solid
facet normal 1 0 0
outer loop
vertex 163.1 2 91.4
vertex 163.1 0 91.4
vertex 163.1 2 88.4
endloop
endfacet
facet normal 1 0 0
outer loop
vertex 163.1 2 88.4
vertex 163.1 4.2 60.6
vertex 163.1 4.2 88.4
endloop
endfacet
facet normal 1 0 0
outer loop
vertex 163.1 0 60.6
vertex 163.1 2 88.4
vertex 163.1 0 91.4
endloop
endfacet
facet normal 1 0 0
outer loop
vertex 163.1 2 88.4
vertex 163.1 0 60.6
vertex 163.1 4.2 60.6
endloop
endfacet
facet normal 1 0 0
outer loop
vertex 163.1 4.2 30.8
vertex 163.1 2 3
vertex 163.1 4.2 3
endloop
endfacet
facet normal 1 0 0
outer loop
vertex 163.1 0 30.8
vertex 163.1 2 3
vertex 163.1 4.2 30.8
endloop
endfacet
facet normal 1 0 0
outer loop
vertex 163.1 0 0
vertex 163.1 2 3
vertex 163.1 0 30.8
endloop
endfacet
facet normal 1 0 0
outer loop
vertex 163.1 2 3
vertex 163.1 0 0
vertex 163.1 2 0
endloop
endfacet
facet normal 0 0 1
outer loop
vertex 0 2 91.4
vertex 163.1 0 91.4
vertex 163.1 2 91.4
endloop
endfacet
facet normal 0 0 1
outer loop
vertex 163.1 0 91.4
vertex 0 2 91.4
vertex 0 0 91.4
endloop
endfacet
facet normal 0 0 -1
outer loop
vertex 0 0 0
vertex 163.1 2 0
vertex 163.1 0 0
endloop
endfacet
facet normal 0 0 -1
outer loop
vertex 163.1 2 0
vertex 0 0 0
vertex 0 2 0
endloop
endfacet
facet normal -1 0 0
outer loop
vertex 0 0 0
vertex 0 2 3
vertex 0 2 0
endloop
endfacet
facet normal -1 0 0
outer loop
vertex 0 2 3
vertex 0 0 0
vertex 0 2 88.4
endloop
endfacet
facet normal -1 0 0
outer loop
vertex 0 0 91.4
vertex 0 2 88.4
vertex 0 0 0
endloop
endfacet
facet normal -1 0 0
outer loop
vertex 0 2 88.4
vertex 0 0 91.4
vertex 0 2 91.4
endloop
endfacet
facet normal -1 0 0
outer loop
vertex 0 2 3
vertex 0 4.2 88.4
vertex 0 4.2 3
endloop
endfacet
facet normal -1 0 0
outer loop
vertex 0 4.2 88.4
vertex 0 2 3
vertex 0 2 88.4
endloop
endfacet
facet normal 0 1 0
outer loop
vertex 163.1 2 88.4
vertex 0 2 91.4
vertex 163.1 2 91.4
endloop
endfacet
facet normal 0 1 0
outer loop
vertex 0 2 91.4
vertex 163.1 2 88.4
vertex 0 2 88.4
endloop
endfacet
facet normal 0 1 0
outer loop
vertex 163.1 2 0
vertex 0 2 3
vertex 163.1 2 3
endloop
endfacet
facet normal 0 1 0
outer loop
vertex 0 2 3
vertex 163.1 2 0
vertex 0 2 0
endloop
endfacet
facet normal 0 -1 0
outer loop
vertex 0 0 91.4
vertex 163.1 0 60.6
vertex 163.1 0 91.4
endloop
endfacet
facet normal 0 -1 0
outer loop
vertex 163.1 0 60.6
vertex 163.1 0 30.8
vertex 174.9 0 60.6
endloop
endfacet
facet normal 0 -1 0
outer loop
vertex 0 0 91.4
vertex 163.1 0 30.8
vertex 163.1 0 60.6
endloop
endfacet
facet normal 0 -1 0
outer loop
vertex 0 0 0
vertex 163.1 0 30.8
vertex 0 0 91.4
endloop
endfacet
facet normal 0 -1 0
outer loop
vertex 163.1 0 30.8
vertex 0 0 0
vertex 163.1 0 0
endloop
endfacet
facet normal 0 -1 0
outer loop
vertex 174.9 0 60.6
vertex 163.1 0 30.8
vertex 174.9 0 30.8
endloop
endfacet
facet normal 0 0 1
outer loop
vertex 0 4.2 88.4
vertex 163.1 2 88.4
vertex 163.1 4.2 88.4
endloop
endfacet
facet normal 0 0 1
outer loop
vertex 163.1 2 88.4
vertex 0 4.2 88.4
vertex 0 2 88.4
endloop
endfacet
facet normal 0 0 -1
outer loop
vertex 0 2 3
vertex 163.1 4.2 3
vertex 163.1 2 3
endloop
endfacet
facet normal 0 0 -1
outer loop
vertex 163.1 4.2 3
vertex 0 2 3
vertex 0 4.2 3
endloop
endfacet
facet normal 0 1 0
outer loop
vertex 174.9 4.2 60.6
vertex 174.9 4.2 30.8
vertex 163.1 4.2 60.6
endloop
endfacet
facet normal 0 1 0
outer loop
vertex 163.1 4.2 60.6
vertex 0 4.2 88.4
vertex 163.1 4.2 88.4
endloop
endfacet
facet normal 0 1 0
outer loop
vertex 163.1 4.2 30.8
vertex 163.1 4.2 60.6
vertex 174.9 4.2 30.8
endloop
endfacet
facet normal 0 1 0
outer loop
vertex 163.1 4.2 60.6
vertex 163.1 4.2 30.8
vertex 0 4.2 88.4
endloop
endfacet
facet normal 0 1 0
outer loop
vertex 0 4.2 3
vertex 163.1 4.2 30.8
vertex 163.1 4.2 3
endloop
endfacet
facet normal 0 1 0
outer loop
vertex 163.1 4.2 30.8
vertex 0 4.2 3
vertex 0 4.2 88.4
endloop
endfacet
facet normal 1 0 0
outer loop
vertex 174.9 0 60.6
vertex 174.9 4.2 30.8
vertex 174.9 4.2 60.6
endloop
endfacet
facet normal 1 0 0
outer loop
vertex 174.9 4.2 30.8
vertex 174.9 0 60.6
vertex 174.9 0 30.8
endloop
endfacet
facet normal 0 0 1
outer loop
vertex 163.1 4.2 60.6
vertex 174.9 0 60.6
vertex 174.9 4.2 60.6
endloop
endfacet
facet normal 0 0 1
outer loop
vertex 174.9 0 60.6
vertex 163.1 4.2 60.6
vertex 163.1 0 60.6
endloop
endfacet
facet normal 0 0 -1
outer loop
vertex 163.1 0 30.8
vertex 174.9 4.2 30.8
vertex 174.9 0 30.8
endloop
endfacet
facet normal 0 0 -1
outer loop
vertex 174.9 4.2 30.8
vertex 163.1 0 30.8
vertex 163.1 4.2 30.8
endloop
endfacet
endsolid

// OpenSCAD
// Side box back door (SolidWorks part 004). Slides into the grooves on the
// back of a side box. Same stepped profile as the display door: the wide flange
// rides in the grooves and the narrow lip fills the opening flush with the back.
// A full-thickness tab sticks out of the inner end (toward the center body).
// The same part is used for both side boxes (the right one is rotated 180°).
// Frame: X = length, Y = depth (0 = inside face, toward the front), Z = height.

side_door_l = 163.1;          // length without the tab
side_door_h = 91.4;           // flange height (rides in the grooves)
side_door_flange_t = 2.0;     // flange thickness
side_door_lip_t = 2.2;        // lip thickness (flush with the back)
side_door_lip_inset = 3.0;    // lip is shorter than the flange by this much at top and bottom
side_door_tab_l = 11.8;       // tab length past the end of the door
side_door_tab_z = 30.8;       // tab bottom edge
side_door_tab_h = 29.8;       // tab height

module side_door() {
  // Flange
  cube([side_door_l, side_door_flange_t, side_door_h]);
  // Lip
  translate([0, 0, side_door_lip_inset])
    cube([side_door_l, side_door_flange_t + side_door_lip_t, side_door_h - 2 * side_door_lip_inset]);
  // Tab
  translate([side_door_l, 0, side_door_tab_z])
    cube([side_door_tab_l, side_door_flange_t + side_door_lip_t, side_door_tab_h]);
}

side_door();
